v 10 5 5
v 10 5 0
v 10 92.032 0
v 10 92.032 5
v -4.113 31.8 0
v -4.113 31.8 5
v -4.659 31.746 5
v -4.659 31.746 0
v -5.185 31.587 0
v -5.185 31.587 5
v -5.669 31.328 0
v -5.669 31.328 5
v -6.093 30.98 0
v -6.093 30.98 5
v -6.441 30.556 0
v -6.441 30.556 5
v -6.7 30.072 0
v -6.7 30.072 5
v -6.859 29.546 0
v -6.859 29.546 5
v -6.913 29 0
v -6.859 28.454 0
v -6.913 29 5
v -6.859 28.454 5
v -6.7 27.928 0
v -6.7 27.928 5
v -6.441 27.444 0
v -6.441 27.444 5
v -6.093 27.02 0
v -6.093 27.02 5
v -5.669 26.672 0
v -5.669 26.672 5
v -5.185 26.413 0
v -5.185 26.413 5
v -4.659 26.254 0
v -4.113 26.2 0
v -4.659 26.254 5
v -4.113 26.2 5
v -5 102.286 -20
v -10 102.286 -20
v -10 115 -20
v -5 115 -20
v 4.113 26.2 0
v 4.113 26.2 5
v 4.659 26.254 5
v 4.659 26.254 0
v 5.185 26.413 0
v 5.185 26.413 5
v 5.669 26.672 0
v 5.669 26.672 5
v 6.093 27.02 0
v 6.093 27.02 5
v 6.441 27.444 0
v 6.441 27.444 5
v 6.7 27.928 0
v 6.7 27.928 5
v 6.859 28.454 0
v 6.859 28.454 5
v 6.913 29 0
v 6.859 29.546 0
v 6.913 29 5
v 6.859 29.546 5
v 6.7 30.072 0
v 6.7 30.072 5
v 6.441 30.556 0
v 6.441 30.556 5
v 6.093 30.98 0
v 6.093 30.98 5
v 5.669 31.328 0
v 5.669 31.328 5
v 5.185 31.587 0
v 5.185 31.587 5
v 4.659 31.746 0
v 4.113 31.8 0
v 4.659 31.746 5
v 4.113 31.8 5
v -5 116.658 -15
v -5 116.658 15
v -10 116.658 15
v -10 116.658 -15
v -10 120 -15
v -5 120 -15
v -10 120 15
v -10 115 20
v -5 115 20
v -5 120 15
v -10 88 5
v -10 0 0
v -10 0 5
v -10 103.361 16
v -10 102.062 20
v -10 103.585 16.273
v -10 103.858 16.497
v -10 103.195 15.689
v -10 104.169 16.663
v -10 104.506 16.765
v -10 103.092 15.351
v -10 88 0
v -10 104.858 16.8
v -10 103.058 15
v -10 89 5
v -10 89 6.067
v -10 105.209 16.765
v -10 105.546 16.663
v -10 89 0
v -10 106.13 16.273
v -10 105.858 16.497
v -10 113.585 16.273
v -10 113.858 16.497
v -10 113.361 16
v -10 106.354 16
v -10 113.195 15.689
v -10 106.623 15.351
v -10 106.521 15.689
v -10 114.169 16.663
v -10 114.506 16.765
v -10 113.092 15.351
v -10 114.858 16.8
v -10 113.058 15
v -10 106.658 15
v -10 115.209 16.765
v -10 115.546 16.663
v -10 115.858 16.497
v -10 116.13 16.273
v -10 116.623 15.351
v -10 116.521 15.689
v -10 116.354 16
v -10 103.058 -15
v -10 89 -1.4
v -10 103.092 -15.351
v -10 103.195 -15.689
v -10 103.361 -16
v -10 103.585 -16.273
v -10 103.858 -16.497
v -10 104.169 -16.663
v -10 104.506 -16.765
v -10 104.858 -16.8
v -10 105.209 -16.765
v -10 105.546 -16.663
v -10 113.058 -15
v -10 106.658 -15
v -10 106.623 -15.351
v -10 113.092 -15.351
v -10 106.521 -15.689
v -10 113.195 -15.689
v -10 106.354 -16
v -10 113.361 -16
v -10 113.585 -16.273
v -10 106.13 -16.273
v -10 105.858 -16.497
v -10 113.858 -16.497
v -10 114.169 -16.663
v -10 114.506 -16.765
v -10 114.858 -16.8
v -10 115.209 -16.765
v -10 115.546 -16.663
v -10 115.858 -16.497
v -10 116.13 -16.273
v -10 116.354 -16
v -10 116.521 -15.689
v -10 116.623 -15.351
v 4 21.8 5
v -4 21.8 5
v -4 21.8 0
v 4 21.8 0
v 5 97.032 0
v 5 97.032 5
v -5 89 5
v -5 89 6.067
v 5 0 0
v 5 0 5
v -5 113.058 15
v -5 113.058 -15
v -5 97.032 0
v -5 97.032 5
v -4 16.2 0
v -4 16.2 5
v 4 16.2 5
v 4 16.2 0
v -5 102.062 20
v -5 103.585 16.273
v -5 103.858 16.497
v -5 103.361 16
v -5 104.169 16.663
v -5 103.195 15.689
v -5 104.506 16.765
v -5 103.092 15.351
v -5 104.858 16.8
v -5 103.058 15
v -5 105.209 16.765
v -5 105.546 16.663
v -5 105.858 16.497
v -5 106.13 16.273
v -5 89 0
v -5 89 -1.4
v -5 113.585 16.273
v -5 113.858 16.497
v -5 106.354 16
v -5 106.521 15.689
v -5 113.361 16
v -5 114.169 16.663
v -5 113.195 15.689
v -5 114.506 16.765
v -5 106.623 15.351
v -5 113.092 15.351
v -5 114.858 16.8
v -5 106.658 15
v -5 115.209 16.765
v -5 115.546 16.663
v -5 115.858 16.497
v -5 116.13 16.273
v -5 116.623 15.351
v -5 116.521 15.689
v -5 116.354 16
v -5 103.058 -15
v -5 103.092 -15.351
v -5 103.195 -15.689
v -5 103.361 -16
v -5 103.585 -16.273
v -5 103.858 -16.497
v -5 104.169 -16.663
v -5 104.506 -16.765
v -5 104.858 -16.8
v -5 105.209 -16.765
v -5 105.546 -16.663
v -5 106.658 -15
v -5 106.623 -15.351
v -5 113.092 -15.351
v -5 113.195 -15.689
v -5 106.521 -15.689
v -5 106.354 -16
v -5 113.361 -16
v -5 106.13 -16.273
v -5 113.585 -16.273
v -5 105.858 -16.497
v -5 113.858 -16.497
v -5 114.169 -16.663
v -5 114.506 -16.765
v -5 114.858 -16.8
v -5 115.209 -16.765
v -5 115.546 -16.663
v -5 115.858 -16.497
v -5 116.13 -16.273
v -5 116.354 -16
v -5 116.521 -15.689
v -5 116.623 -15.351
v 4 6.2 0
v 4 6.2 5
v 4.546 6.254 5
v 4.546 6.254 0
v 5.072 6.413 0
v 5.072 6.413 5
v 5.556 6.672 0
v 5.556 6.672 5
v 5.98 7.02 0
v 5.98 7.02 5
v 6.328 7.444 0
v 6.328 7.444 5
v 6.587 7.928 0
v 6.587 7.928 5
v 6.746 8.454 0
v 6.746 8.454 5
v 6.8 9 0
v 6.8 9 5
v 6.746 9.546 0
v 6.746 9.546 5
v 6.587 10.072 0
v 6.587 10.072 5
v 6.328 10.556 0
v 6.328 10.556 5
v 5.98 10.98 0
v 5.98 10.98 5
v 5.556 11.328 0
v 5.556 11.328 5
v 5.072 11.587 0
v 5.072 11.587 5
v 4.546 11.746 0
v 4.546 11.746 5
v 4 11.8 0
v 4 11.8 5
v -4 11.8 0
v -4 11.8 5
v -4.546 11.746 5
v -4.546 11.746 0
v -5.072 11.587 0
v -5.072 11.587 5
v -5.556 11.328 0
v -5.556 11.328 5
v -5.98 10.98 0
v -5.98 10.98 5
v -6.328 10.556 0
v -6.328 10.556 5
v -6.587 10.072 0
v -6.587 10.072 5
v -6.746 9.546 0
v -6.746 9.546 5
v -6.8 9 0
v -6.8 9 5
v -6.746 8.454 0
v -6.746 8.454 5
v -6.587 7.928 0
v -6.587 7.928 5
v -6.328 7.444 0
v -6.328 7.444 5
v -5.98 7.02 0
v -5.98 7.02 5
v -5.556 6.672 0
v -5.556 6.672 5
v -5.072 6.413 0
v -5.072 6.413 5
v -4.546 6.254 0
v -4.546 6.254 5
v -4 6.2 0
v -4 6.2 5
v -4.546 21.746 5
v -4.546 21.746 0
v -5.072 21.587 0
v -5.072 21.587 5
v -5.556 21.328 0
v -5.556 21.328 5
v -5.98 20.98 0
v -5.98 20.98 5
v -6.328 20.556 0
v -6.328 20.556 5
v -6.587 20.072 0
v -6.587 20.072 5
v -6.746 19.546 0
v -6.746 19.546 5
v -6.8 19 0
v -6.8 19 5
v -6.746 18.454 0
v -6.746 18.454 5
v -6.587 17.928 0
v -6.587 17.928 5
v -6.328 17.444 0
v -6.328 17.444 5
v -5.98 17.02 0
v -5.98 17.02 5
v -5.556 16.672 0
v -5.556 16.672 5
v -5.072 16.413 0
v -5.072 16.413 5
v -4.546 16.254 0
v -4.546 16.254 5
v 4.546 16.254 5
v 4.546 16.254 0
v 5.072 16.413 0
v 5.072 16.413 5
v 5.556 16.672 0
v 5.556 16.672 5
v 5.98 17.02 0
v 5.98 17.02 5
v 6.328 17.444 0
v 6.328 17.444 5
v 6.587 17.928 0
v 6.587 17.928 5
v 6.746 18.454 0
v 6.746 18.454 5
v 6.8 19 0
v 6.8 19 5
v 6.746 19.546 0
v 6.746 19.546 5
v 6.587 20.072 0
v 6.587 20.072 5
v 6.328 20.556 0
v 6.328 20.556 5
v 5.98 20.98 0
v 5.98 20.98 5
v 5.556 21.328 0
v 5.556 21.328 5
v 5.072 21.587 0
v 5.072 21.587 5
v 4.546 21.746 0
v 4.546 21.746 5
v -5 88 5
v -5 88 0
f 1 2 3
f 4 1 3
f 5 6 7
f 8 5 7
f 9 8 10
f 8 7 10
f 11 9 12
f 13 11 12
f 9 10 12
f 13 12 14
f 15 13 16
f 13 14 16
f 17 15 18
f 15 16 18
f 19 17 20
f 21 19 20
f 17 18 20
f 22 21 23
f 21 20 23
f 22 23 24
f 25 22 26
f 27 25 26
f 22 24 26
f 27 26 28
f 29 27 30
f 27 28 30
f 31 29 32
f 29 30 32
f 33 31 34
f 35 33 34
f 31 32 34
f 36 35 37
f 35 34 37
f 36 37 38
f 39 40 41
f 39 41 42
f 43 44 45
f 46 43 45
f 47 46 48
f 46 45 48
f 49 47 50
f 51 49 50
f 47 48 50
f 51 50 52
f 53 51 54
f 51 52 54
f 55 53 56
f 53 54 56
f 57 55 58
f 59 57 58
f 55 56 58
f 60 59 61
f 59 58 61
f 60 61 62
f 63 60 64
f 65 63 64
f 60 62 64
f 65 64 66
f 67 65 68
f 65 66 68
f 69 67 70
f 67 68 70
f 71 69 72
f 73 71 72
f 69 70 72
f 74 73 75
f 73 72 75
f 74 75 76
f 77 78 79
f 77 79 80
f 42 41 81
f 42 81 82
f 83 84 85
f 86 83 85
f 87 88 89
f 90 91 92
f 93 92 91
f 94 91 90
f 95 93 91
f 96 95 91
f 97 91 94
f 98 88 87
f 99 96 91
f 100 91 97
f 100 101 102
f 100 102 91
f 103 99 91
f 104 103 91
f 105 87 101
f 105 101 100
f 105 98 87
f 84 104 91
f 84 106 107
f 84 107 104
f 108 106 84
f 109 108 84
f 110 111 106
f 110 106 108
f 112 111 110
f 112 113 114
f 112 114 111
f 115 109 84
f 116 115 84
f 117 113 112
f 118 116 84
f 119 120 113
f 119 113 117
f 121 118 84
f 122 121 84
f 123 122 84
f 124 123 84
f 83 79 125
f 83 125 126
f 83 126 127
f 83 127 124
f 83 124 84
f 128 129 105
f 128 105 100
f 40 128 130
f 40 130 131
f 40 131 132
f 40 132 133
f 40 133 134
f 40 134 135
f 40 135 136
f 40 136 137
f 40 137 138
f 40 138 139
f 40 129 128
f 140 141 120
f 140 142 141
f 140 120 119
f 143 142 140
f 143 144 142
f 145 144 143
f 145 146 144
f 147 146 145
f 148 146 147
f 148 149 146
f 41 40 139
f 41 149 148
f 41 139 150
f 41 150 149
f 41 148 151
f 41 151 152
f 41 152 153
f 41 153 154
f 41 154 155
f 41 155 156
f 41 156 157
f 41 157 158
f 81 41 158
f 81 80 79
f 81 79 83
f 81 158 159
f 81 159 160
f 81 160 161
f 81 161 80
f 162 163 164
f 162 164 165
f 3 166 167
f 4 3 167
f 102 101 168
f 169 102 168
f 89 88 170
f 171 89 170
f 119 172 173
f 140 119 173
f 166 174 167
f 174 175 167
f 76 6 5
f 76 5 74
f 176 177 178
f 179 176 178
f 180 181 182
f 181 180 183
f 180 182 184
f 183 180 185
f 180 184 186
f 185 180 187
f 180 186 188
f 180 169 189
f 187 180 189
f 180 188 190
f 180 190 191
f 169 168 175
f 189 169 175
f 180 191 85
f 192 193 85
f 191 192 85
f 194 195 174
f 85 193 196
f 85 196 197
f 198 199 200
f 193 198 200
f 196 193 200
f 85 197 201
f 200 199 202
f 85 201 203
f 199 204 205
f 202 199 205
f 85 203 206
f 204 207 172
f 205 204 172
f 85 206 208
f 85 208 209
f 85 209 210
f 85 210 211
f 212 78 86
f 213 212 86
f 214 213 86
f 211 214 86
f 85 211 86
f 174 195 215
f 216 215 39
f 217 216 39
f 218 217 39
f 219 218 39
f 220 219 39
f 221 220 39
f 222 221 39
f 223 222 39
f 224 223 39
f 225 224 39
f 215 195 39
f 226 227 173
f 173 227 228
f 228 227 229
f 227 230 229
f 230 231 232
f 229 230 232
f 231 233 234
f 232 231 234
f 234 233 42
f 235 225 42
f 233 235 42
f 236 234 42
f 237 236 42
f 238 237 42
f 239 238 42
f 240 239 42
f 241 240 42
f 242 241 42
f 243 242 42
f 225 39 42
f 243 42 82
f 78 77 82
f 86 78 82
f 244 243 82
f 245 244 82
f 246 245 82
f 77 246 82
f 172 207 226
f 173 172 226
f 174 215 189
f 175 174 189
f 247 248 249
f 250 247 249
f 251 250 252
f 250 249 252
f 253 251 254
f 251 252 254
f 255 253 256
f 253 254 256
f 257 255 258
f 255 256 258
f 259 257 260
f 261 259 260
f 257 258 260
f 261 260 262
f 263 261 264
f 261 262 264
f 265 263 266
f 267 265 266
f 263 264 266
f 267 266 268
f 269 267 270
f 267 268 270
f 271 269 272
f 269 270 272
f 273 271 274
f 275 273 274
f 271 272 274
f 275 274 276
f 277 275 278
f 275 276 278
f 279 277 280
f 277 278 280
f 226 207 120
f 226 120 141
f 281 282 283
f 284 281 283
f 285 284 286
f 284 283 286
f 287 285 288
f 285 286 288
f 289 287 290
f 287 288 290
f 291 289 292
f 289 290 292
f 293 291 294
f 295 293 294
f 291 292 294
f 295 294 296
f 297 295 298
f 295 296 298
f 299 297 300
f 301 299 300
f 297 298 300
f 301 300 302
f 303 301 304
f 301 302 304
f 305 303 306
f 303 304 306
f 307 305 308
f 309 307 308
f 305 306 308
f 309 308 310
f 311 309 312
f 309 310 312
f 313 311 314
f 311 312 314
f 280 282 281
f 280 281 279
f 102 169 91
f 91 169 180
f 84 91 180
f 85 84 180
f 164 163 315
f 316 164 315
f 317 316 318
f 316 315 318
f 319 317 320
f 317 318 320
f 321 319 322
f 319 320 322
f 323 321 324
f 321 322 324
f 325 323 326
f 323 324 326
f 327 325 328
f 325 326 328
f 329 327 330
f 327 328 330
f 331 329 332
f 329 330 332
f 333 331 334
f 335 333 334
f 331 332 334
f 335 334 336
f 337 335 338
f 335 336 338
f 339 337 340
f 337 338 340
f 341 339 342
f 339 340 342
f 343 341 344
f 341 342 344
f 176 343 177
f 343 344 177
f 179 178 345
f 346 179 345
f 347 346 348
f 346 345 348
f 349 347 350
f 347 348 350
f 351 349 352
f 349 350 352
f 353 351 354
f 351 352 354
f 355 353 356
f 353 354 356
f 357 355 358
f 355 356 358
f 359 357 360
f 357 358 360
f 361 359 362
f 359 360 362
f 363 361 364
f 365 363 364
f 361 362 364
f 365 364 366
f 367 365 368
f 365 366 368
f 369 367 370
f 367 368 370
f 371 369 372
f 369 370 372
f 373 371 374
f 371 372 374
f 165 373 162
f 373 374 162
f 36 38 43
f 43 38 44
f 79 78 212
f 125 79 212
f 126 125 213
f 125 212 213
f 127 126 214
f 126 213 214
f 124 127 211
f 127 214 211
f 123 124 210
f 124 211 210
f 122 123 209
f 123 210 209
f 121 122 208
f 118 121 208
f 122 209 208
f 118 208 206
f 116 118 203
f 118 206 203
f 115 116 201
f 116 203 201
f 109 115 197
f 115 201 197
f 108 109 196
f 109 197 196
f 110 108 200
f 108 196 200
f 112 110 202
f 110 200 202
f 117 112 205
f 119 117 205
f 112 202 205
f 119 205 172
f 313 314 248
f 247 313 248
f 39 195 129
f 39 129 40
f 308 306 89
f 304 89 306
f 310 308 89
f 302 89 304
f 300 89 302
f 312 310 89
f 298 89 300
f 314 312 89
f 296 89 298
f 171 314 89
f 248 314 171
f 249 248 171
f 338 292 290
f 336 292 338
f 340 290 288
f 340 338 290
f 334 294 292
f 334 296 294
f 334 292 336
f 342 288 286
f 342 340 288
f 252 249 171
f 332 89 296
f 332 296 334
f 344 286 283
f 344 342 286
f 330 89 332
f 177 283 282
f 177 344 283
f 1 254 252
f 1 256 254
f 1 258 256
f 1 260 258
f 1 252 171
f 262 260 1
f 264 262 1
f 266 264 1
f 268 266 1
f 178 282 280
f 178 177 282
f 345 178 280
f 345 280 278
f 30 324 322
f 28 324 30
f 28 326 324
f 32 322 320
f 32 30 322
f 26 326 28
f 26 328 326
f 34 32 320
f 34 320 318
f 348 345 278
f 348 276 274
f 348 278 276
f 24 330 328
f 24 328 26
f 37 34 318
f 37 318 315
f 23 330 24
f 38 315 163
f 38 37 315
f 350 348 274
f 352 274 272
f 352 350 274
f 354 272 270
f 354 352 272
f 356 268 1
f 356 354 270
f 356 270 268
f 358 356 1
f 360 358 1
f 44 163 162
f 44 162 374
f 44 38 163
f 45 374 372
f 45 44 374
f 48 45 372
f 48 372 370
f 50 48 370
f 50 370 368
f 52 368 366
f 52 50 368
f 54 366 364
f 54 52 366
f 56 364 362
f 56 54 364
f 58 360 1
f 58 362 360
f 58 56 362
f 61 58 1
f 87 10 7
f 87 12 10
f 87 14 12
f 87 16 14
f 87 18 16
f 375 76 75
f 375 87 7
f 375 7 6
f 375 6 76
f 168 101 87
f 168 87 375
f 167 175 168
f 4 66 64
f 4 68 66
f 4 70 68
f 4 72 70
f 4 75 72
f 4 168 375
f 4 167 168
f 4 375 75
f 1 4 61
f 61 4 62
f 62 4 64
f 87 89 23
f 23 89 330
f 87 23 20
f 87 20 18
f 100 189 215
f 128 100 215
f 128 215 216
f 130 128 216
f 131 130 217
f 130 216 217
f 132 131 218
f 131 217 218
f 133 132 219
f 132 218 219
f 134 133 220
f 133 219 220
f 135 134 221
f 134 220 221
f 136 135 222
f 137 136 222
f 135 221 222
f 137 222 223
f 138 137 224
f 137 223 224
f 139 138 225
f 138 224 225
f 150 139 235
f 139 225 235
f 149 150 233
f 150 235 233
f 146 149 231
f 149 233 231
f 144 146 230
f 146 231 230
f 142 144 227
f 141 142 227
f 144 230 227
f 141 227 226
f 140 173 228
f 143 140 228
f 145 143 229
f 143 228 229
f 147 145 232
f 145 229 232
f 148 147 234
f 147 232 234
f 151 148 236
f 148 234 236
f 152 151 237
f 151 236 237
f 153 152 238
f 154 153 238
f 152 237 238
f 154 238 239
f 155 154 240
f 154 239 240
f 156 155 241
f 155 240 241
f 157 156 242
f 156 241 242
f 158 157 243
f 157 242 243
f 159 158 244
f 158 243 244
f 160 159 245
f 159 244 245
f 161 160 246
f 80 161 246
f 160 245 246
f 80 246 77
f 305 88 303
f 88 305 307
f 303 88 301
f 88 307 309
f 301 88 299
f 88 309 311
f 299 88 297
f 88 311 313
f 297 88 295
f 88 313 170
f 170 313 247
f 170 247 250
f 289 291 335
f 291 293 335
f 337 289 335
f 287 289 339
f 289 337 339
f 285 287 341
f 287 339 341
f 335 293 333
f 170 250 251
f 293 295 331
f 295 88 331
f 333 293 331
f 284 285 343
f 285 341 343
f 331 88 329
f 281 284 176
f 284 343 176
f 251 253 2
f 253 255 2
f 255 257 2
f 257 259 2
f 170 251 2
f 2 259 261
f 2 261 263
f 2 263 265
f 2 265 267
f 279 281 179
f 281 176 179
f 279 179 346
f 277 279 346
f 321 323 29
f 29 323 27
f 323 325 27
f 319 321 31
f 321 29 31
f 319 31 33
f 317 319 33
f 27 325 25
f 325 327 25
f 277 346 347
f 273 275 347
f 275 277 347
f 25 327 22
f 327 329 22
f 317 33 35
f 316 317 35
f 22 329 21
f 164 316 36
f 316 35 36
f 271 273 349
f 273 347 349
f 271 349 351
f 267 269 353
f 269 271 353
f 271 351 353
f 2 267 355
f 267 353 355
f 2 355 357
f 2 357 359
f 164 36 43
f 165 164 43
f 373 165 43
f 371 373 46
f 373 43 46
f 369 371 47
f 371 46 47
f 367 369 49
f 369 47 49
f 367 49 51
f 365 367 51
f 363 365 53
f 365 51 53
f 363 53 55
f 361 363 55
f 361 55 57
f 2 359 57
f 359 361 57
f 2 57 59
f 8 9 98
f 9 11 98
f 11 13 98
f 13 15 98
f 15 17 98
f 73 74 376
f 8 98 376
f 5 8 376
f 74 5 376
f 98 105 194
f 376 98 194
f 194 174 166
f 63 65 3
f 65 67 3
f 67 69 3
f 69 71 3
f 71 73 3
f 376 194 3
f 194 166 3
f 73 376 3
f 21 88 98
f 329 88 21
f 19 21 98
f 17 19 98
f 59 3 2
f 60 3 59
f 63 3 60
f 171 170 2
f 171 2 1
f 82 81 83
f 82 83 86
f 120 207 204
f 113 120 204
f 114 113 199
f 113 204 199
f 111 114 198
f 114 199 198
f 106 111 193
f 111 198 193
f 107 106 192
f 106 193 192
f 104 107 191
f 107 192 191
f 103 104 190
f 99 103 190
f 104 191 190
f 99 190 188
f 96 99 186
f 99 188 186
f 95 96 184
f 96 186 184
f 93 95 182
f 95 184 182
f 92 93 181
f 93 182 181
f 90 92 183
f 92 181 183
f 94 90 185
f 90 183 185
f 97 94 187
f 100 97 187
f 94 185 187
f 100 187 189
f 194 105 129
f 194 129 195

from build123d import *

# Parameters (mm, degrees)
SKETCH_W          = 20
SKETCH_H          = 120
PAD_DEPTH         = 5
SKETCH001_W       = 15.635981
SKETCH001_H       = 23
POCKET_DEPTH      = 5.001
SKETCH002_W       = 5
SKETCH002_H       = 31
PAD001_DEPTH      = 15
PAD001_DEPTH_BACK = 25
POCKET001_DEPTH   = 5
CHAMFER_SIZE      = 5


with BuildPart() as part:
    # Sketch → Pad (new body)
    with BuildSketch(Plane.XY):
        with Locations((0, 60)):
            Rectangle(SKETCH_W, SKETCH_H)
    extrude(amount=PAD_DEPTH)

    # Sketch001 → Pocket (cut, through all)
    with BuildSketch(Plane.XY.offset(5)):
        with BuildLine():
            ThreePointArc((-4, 11.8), (-6.8, 9), (-4, 6.2))
            Line((-4, 6.2), (4, 6.2))
            ThreePointArc((4, 6.2), (6.8, 9), (4, 11.8))
            Line((-4, 11.8), (4, 11.8))
        make_face()
        with BuildLine():
            ThreePointArc((-4, 21.8), (-6.8, 19), (-4, 16.2))
            Line((-4, 16.2), (4, 16.2))
            ThreePointArc((4, 16.2), (6.8, 19), (4, 21.8))
            Line((-4, 21.8), (4, 21.8))
        make_face()
        with Locations((2.81799, 108.532179)):
            Rectangle(SKETCH001_W, SKETCH001_H)
        with BuildLine():
            ThreePointArc((-4.113055, 31.8), (-6.913055, 29), (-4.113055, 26.2))
            Line((-4.113055, 26.2), (4.113055, 26.2))
            ThreePointArc((4.113055, 26.2), (6.913055, 29), (4.113055, 31.8))
            Line((-4.113055, 31.8), (4.113055, 31.8))
        make_face()
    extrude(amount=-POCKET_DEPTH, mode=Mode.SUBTRACT)

    # Sketch002 → Pad001 (new body, two sides)
    with BuildSketch(Plane.XY.offset(5)) as pad001_sk:
        with Locations((-7.5, 104.5)):
            Rectangle(SKETCH002_W, SKETCH002_H)
    extrude(amount=PAD001_DEPTH)
    extrude(pad001_sk.sketch, amount=-PAD001_DEPTH_BACK)

    # Sketch003 → Pocket001 (cut)
    with BuildSketch(Plane.YZ.offset(-5)):
        with BuildLine():
            ThreePointArc((116.657567, 15), (114.857567, 16.8), (113.057567, 15))
            Line((113.057567, 15), (113.057567, -15))
            ThreePointArc((113.057567, -15), (114.857567, -16.8), (116.657567, -15))
            Line((116.657567, 15), (116.657567, -15))
        make_face()
        with BuildLine():
            ThreePointArc((106.657567, 15), (104.857567, 16.8), (103.057567, 15))
            Line((103.057567, 15), (103.057567, -15))
            ThreePointArc((103.057567, -15), (104.857567, -16.8), (106.657567, -15))
            Line((106.657567, 15), (106.657567, -15))
        make_face()
        Polygon((88, 5), (103, 21), (88, 21), align=None)
        Polygon((88, 0), (103, -21), (88, -21), align=None)
    extrude(amount=-POCKET001_DEPTH, mode=Mode.SUBTRACT)

    # Chamfer
    chamfer_edges = [part.edges().sort_by_distance(p)[0] for p in [
        (10, 0, 2.5),
        (10, 97.032179, 2.5),
        (-7.5, 120, 20),
        (-7.5, 120, -20),
    ]]
    chamfer(chamfer_edges, length=CHAMFER_SIZE)


solid = part.part
